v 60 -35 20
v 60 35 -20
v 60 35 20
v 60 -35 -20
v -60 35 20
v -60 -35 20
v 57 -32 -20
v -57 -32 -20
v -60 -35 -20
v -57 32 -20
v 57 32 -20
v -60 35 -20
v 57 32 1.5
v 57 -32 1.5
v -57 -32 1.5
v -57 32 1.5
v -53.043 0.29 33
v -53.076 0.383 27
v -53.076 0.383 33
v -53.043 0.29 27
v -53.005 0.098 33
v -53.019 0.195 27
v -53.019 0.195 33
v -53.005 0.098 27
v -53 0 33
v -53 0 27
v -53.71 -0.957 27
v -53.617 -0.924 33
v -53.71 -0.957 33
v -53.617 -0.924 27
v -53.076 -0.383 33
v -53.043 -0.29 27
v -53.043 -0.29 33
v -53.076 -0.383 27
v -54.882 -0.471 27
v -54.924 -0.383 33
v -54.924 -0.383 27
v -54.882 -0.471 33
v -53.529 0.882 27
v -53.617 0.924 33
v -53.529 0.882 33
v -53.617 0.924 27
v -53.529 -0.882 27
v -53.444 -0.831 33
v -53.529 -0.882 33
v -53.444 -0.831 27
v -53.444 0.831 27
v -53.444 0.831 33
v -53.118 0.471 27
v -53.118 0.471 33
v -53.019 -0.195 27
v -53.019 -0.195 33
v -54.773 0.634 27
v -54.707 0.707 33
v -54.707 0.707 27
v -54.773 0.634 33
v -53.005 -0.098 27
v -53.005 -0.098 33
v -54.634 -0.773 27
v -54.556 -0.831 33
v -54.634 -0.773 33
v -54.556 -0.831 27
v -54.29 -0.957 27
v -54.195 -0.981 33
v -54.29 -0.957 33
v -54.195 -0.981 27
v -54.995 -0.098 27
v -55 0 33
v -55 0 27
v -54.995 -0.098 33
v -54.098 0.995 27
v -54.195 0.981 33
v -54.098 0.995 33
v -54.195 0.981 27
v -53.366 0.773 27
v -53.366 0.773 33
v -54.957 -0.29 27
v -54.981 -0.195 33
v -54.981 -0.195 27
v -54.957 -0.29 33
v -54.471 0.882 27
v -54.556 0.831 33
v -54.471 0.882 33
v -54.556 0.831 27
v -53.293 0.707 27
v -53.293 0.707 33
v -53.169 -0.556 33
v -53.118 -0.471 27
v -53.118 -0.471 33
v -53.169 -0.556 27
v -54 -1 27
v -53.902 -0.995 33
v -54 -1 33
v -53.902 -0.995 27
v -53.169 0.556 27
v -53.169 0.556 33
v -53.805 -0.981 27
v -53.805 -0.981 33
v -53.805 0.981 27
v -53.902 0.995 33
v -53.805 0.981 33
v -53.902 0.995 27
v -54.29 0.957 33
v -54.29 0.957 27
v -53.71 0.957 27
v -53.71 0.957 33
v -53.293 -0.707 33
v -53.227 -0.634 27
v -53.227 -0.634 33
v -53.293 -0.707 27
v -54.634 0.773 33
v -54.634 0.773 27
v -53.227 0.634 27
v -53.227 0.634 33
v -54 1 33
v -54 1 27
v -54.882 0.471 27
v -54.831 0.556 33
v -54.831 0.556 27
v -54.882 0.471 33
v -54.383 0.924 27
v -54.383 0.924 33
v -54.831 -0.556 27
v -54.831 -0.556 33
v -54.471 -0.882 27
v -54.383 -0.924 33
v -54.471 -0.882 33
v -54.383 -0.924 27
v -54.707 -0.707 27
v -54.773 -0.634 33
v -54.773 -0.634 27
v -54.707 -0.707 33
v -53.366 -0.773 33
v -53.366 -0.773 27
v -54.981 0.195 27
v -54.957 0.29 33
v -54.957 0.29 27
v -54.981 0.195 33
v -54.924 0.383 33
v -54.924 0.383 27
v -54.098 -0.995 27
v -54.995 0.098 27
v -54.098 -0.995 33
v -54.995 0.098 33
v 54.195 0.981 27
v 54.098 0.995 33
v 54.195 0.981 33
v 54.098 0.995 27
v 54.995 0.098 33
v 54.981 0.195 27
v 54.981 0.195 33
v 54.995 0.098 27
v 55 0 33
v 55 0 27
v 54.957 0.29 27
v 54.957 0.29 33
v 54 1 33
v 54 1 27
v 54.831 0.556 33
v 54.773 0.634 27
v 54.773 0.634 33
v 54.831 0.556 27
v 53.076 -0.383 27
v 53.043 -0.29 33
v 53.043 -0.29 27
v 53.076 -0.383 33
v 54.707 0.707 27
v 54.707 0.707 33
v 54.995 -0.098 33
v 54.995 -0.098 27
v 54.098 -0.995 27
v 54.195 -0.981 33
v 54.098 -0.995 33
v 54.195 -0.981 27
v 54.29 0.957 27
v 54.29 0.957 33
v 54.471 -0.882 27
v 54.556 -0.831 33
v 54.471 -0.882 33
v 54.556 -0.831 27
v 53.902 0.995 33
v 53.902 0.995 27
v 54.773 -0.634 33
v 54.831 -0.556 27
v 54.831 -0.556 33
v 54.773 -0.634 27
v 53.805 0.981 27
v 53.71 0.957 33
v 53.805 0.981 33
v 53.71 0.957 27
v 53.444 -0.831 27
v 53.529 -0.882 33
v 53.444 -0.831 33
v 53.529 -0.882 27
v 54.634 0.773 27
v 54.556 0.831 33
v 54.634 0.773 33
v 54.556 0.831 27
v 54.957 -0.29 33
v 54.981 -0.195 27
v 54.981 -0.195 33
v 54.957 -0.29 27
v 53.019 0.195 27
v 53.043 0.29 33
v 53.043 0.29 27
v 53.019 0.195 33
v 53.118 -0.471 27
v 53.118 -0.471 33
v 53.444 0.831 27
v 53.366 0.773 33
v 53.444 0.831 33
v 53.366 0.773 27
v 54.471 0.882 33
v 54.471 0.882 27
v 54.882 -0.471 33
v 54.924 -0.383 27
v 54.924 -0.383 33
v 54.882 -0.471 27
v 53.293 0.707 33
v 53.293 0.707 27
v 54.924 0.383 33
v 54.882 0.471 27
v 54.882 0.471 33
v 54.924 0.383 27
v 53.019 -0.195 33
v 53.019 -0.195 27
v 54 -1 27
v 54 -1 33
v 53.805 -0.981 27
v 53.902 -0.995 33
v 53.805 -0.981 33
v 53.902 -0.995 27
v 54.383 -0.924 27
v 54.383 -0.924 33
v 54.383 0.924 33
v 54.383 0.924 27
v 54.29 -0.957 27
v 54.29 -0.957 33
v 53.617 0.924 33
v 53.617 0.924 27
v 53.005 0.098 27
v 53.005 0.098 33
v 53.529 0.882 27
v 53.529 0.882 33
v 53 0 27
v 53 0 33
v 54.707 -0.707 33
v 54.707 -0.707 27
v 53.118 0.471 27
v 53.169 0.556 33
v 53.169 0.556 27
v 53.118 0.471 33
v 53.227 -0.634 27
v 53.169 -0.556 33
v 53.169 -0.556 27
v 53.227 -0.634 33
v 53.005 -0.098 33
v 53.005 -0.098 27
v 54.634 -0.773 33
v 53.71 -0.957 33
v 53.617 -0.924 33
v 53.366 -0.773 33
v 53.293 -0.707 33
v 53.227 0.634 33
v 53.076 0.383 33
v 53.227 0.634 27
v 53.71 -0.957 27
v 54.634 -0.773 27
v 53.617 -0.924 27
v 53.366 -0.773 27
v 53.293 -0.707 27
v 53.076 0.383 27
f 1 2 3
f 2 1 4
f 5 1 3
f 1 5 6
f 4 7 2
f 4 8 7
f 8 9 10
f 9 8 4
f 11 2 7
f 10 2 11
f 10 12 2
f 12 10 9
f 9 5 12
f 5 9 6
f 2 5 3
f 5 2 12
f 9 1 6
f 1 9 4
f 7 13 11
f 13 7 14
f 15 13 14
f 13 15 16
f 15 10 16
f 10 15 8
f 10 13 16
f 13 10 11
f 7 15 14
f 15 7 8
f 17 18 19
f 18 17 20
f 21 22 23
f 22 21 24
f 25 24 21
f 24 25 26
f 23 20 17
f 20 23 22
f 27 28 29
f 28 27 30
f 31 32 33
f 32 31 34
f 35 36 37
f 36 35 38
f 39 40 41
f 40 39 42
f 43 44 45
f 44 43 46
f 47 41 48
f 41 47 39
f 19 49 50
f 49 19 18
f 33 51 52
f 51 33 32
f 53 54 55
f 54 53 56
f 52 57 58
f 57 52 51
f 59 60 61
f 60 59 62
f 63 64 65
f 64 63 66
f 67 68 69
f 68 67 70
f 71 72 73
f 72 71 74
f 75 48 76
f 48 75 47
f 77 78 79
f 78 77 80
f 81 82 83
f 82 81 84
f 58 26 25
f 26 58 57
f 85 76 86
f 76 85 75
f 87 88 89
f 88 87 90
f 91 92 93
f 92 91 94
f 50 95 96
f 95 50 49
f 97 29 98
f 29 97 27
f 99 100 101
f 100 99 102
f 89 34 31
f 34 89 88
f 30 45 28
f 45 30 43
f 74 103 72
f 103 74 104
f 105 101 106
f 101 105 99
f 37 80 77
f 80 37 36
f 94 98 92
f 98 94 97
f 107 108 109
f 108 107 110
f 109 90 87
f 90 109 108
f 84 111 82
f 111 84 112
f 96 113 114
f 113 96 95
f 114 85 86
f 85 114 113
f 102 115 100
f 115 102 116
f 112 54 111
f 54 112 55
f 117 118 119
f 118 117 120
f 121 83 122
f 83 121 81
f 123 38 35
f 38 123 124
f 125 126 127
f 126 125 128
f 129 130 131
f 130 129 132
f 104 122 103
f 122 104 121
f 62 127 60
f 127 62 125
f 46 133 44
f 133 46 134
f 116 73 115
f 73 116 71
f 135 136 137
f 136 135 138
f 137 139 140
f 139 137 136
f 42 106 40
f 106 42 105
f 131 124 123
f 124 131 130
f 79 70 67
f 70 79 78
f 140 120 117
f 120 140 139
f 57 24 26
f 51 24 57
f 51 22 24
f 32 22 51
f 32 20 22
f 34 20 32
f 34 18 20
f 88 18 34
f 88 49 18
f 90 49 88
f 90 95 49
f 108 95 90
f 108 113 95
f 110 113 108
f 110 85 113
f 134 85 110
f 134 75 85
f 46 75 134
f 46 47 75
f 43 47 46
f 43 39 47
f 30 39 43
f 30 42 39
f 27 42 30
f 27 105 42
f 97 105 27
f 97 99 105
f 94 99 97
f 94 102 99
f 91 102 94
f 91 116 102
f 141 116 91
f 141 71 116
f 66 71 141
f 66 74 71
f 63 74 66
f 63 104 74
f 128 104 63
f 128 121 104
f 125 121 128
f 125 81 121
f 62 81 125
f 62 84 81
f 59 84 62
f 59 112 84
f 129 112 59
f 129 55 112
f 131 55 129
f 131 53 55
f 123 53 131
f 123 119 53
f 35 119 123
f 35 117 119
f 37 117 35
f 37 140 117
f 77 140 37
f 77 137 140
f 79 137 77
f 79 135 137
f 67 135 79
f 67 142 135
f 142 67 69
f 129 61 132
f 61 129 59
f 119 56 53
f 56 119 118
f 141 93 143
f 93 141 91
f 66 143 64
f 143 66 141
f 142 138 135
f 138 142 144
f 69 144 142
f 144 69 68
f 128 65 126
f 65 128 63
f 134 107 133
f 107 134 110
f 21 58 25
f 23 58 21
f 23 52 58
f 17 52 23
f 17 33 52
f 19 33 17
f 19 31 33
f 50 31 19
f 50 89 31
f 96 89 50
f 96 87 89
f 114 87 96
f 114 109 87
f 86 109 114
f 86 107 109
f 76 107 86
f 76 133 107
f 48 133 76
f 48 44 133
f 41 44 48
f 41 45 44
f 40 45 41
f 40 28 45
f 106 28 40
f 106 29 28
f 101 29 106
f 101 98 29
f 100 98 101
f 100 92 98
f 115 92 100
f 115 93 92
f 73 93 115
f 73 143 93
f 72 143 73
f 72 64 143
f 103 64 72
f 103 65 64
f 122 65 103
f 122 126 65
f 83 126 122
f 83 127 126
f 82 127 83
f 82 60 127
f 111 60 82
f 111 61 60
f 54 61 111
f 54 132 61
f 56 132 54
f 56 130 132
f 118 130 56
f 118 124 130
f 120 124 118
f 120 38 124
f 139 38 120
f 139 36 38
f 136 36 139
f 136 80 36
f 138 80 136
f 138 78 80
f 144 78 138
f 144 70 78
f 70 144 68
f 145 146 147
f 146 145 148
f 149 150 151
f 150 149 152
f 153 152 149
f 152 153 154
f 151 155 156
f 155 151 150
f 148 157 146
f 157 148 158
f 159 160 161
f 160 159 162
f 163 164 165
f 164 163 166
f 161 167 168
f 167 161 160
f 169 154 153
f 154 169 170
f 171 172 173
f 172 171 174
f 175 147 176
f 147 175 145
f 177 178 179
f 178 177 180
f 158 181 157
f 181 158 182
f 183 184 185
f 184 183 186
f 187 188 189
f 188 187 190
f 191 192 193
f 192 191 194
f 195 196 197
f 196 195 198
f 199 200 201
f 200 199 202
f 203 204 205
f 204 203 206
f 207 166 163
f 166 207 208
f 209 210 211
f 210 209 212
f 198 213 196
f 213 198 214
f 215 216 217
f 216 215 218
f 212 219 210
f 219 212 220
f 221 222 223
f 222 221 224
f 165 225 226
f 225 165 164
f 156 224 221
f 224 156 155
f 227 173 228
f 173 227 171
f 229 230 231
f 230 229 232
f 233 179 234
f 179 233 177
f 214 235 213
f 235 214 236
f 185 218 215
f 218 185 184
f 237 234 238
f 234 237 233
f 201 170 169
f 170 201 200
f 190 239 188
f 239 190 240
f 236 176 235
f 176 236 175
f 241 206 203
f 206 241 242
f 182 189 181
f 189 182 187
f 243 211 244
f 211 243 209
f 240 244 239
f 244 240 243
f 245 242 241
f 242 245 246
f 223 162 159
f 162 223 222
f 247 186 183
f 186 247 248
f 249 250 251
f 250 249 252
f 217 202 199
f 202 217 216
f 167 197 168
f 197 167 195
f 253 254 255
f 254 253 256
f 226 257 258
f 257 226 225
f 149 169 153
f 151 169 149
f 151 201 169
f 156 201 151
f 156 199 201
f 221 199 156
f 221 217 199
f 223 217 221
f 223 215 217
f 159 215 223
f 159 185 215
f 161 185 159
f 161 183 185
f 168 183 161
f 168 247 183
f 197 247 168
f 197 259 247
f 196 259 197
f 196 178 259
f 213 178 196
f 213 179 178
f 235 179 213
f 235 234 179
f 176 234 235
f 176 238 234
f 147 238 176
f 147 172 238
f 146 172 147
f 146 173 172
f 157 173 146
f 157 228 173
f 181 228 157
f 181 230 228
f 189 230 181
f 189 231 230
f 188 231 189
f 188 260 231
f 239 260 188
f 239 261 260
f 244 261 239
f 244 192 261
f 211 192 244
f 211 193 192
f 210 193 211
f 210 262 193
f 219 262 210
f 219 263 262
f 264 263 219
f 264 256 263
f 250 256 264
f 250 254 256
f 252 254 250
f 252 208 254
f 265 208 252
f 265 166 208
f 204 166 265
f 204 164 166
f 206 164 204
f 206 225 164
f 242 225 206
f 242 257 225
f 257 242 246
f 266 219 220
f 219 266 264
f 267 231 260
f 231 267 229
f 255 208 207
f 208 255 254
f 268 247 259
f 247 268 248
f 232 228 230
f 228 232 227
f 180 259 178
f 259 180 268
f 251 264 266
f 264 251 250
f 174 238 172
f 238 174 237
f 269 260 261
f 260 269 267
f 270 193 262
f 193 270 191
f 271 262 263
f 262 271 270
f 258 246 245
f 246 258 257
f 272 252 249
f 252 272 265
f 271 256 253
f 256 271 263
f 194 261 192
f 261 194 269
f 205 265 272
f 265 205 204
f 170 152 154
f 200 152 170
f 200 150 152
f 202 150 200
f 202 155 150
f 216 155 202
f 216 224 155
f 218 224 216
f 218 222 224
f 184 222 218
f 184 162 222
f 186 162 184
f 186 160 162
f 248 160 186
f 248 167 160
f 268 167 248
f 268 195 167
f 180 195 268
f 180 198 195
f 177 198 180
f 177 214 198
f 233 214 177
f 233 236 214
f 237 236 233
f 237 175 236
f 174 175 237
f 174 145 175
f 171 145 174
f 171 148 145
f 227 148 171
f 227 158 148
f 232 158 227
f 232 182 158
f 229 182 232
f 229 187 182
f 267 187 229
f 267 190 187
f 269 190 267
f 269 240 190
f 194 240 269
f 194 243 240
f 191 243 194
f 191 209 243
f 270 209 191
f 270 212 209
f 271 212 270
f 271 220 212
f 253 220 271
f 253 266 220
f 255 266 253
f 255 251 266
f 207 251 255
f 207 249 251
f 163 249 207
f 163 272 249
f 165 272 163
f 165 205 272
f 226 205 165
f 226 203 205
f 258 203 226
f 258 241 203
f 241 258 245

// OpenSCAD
// Dimensions in millimetres
outer_x = 120;
outer_y = 70;
outer_z = 40;

wall_thickness = 3;
floor_thickness = 3;

platform_length = 60;
platform_width = outer_y;  // spans full Y
platform_height_above_floor = 10;  // top of platform at z = 13 (floor at z = 3)

hole_diameter = 2;
hole_radius = hole_diameter / 2;
hole_y = 0;  // along Y=0 edge
hole_z = 30;  // at z = 30

// Inner dimensions
inner_x = outer_x - 2 * wall_thickness;
inner_y = outer_y - 2 * wall_thickness;
inner_z = outer_z - floor_thickness;

// Platform is centred in X
platform_x_center = (outer_x - platform_length) / 2;

// Set resolution for smooth curves
$fn = 64;

// Main tank body (outer box with walls and floor)
module tank_body() {
    difference() {
        // Outer box (full size)
        cube([outer_x, outer_y, outer_z], center = true);

        // Remove inner cavity (to create walls and floor)
        translate([0, 0, -outer_z/2 + floor_thickness]) {
            cube([inner_x, inner_y, outer_z - floor_thickness], center = true);
        }
    }
}

// Platform for gel tray (raised solid in the middle)
module platform() {
    translate([
        0,  // centered in Y
        0,  // centered in X (via offset)
        floor_thickness + platform_height_above_floor
    ]) {
        cube([platform_length, platform_width, wall_thickness], center = true);
    }
}

// Horizontal holes through end walls (X=±outer_x/2) at y=0, z=30
module electrode_holes() {
    // Left hole (X = -outer_x/2 + wall_thickness)
    translate([
        -outer_x/2 + wall_thickness + wall_thickness,  // offset to inner face
        0,
        hole_z
    ]) {
        cylinder(h = 2 * wall_thickness, r = hole_radius, center = true);
    }

    // Right hole (X = +outer_x/2 - wall_thickness)
    translate([
        outer_x/2 - wall_thickness - wall_thickness,  // offset to inner face
        0,
        hole_z
    ]) {
        cylinder(h = 2 * wall_thickness, r = hole_radius, center = true);
    }
}

// Assemble the complete buffer tank
tank_body();
platform();
electrode_holes();
